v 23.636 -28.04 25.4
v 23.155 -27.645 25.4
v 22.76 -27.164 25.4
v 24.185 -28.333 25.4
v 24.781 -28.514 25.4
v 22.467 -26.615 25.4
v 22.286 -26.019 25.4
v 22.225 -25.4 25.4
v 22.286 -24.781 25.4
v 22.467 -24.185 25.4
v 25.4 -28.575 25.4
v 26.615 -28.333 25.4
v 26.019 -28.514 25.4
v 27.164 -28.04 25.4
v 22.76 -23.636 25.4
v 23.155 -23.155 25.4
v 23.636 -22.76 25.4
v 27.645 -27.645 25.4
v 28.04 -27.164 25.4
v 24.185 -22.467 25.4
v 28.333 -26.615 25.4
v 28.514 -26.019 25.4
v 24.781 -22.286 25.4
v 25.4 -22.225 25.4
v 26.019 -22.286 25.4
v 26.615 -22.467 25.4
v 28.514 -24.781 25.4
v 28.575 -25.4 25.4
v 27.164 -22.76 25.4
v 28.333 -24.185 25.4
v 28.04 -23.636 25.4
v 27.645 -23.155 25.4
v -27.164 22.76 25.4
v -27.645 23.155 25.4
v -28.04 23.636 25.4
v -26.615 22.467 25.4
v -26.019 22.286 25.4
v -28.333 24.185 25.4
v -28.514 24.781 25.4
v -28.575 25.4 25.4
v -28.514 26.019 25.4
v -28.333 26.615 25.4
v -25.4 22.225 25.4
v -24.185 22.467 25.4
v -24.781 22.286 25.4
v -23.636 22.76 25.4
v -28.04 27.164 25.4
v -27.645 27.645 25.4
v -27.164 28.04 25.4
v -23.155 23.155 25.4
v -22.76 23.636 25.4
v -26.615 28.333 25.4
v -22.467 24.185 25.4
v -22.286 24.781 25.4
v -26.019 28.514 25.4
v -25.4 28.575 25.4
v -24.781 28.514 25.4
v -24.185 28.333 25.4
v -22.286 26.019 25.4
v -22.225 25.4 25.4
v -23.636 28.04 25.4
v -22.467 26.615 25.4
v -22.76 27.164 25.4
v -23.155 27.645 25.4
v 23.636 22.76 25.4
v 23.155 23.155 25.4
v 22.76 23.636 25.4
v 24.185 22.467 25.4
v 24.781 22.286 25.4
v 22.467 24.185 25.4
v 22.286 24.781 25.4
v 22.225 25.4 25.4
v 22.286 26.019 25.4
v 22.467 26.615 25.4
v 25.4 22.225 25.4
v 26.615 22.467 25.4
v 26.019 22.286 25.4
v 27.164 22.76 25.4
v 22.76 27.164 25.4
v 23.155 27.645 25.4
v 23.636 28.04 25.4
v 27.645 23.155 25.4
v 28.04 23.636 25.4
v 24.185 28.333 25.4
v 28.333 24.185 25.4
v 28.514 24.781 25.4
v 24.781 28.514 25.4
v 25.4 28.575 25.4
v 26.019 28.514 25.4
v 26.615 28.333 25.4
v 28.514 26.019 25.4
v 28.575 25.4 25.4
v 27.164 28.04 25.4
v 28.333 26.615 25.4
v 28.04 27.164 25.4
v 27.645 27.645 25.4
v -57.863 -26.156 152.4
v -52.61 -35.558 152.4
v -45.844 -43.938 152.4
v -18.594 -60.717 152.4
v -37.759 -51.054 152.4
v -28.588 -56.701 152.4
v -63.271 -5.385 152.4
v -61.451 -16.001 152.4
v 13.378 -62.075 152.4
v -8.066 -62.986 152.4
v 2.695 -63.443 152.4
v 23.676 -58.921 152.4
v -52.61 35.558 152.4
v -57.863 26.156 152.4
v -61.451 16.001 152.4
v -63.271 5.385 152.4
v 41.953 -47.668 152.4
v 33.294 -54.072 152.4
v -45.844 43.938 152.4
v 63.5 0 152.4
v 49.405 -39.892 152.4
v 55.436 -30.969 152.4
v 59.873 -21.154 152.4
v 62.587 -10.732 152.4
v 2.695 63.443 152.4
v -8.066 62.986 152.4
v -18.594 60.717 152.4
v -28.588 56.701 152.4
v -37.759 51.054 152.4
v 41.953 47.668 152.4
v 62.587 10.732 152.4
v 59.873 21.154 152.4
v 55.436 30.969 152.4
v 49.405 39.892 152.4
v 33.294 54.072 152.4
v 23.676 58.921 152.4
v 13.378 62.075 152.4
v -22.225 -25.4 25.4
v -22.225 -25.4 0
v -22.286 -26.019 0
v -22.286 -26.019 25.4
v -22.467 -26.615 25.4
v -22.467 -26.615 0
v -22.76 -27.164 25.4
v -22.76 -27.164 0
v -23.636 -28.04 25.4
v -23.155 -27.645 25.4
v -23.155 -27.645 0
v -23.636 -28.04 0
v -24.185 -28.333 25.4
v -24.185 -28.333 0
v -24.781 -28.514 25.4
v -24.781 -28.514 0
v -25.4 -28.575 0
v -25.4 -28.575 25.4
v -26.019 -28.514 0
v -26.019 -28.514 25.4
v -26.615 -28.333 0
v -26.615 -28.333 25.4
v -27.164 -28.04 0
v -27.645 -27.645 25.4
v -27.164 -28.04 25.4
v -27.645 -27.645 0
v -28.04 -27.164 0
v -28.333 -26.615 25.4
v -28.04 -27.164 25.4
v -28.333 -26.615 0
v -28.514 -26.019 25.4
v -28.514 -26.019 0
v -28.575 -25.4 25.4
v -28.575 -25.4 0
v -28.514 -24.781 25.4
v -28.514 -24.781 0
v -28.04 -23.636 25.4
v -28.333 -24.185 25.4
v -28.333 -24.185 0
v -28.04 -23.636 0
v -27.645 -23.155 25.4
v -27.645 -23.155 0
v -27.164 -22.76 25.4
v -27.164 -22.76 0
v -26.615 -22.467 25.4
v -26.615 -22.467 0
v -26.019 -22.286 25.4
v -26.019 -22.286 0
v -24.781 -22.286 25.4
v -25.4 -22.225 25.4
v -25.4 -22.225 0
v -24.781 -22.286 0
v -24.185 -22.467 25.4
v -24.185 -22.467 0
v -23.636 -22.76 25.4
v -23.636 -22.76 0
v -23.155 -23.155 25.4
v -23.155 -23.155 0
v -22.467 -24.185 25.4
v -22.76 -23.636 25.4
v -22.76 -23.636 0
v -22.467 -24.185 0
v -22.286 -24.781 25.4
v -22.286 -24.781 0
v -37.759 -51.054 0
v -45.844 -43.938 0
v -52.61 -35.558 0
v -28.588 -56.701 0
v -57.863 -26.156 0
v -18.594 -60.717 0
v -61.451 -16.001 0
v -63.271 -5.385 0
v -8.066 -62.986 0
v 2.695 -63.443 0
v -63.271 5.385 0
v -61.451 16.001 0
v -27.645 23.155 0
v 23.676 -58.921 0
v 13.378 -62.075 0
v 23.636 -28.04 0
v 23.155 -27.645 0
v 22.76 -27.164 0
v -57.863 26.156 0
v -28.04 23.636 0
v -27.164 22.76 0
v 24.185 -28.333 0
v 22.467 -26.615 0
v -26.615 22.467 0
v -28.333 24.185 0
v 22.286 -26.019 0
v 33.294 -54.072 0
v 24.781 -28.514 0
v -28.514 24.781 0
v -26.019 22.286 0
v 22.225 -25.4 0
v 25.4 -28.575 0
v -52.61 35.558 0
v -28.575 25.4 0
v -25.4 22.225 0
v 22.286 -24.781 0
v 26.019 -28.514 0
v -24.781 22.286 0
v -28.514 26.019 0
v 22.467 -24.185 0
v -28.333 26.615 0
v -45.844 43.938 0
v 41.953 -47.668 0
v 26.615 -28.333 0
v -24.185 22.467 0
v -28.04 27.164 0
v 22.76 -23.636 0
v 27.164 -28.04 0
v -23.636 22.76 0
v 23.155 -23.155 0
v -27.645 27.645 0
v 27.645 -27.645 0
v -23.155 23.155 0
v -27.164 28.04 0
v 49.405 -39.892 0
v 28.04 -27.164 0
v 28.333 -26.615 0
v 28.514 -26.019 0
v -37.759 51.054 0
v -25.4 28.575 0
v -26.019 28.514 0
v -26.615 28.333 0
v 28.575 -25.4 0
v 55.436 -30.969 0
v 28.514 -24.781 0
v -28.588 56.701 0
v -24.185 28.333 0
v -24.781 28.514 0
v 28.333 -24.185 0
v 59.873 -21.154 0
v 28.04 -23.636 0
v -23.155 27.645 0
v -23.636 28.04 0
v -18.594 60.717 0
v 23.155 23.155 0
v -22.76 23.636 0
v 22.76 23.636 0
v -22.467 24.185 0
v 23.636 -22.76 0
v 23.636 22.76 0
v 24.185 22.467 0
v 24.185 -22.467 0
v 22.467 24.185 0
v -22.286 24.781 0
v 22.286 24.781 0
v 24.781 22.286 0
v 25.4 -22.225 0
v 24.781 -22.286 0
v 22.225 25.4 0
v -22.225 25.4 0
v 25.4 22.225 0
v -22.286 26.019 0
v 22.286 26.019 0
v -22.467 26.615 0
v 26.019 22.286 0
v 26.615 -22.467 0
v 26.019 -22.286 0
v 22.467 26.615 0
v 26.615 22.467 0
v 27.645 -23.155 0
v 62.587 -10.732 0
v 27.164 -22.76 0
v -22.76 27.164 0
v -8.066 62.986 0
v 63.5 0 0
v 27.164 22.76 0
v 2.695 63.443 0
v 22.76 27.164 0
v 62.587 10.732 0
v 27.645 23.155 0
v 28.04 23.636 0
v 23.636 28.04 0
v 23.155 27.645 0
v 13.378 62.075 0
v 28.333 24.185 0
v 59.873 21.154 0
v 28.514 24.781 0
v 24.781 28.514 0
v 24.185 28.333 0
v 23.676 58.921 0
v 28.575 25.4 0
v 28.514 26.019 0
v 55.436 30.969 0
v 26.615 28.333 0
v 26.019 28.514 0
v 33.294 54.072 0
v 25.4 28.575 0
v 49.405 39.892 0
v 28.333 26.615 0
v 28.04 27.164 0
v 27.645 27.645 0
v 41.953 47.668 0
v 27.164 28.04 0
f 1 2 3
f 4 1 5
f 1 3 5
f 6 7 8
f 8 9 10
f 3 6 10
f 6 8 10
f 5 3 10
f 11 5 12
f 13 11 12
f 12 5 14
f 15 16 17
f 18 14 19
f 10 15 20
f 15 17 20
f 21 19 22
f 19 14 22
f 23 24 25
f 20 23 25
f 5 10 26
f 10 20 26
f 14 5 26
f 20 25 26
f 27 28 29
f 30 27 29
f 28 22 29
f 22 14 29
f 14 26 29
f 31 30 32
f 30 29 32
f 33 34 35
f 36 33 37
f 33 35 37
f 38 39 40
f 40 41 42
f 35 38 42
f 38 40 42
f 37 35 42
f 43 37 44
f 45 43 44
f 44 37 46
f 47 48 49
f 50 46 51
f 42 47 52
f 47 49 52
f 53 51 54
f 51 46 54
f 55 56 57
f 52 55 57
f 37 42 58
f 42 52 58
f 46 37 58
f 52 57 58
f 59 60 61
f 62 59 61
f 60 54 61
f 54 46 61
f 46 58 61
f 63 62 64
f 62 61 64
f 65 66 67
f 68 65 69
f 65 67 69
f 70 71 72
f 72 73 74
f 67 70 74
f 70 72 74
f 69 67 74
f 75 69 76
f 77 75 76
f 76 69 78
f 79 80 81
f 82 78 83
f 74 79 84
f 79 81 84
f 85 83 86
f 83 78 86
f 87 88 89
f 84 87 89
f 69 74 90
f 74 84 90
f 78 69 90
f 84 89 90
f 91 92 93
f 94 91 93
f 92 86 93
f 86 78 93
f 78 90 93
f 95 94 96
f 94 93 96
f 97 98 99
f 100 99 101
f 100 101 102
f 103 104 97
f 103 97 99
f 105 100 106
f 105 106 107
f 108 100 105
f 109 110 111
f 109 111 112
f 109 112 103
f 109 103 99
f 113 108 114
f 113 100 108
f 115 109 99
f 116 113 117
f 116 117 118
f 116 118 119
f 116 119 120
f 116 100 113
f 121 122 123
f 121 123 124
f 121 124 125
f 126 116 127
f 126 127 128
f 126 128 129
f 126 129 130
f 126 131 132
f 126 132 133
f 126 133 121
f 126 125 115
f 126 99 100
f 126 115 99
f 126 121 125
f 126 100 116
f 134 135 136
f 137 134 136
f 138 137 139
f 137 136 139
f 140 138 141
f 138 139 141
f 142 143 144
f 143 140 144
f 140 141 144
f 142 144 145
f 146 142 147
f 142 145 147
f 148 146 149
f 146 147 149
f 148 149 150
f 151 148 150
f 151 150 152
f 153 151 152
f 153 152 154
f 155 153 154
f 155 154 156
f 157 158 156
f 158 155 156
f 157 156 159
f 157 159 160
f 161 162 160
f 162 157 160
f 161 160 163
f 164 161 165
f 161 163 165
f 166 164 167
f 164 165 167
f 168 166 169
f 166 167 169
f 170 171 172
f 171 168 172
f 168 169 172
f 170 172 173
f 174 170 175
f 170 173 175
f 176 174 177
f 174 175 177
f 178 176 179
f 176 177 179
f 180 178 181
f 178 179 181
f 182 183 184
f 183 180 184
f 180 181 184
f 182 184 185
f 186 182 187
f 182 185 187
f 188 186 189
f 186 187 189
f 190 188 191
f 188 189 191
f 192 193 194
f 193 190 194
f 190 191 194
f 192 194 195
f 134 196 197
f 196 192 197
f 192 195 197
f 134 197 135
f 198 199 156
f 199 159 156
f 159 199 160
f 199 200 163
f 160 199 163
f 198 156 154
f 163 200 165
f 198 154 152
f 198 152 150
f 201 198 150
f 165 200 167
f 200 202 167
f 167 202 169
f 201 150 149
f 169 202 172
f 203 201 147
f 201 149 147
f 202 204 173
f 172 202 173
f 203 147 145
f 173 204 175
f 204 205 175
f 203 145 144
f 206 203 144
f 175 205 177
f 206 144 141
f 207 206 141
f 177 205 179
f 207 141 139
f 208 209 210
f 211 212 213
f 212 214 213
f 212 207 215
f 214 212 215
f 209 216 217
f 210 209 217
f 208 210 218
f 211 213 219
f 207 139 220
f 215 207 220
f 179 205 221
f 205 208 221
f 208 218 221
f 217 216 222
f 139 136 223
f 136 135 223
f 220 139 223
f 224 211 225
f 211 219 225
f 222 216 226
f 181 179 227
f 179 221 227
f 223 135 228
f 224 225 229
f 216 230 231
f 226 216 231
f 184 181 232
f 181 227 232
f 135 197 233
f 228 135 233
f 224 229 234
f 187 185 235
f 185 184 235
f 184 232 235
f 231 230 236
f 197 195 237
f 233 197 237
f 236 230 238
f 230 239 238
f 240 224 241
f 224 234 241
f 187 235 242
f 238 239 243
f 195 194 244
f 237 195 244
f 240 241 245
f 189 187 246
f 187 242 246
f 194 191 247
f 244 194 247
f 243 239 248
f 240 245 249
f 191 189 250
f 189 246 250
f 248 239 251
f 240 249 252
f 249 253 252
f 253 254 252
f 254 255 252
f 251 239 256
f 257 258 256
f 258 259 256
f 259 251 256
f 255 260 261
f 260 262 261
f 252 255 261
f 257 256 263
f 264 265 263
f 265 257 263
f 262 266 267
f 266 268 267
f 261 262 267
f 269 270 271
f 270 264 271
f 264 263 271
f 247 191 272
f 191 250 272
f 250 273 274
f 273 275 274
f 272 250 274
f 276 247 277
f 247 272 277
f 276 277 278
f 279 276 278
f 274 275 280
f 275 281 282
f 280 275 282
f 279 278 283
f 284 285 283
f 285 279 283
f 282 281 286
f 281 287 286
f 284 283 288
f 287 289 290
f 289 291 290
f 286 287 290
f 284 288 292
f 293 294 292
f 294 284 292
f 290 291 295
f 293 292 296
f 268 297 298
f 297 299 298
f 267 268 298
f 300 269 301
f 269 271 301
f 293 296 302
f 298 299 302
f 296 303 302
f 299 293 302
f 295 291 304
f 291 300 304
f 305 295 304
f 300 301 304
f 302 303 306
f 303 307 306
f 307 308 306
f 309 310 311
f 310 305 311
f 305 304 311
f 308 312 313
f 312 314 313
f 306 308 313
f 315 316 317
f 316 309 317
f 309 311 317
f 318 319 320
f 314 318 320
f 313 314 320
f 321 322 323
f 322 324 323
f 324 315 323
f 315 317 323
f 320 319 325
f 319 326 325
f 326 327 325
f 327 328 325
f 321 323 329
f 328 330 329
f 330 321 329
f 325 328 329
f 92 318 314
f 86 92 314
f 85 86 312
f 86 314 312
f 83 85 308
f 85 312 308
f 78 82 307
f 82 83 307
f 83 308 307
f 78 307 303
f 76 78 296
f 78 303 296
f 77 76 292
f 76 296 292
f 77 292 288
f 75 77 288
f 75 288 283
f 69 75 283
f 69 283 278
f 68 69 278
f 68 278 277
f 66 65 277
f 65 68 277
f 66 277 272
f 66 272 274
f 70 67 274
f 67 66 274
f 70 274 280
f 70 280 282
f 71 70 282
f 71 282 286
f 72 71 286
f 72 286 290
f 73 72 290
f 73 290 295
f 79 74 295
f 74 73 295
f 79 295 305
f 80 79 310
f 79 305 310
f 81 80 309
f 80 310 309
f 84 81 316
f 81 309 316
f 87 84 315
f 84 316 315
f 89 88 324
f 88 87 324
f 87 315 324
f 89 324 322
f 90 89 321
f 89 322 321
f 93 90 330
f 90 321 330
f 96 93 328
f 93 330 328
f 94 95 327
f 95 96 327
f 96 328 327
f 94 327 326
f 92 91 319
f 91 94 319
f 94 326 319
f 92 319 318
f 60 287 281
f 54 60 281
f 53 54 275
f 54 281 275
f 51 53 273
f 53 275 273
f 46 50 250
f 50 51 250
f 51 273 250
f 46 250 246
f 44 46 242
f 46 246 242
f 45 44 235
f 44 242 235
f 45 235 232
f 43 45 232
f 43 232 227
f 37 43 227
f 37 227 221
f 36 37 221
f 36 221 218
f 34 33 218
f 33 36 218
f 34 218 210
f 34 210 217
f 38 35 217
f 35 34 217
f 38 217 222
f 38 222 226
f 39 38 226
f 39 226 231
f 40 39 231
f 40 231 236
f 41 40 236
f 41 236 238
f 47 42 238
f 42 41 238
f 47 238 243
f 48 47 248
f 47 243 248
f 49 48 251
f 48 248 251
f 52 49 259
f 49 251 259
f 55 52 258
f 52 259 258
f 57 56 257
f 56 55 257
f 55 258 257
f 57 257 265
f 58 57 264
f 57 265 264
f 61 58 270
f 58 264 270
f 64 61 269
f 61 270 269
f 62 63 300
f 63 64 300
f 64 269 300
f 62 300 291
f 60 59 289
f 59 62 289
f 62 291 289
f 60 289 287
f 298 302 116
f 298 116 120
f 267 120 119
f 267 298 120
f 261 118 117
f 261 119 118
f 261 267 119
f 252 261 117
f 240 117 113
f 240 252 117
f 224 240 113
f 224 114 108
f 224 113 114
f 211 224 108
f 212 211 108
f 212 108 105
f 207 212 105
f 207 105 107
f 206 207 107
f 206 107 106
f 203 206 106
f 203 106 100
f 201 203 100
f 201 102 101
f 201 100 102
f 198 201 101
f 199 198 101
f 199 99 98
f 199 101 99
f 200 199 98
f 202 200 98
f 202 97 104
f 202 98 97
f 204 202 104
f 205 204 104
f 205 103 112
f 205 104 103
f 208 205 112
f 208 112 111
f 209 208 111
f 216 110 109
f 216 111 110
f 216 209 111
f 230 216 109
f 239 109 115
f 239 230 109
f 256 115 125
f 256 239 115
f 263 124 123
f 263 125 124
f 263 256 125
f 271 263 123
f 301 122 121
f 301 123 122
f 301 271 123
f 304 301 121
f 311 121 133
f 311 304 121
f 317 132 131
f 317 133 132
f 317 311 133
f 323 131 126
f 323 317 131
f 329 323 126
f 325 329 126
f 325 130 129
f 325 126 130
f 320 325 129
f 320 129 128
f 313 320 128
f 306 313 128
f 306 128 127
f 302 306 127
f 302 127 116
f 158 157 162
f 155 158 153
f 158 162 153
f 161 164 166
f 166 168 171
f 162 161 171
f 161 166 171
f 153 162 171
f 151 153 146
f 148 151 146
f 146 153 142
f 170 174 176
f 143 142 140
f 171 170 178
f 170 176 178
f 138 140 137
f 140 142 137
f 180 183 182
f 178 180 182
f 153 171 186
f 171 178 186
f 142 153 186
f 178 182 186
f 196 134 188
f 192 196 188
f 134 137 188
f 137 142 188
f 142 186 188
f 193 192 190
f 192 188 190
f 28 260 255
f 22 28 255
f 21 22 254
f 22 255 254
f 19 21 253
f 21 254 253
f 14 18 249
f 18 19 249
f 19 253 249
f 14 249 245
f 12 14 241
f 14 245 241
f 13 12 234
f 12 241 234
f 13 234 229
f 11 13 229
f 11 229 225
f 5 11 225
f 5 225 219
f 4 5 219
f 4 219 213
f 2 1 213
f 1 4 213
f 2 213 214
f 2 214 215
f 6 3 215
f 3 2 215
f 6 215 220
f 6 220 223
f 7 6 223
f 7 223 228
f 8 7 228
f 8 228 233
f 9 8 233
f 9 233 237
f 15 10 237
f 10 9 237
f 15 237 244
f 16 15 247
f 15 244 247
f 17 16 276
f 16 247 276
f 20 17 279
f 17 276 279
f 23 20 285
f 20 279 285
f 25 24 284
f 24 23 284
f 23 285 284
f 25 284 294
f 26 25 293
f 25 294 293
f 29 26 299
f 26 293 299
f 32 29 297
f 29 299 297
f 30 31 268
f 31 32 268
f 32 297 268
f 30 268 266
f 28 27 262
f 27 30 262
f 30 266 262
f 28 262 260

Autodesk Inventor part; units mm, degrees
ref_plane "YZ Plane" through (0, 0, 0) normal (1, 0, 0) x (0, 1, 0)
ref_plane "XZ Plane" through (0, 0, 0) normal (0, 1, 0) x (-1, 0, 0)
ref_plane "XY Plane" through (0, 0, 0) normal (0, 0, 1) x (1, 0, 0)
sketch "Sketch1" plane through (0, 0, 0) normal (0, 0, 1) x (1, 0, 0)
  circle A0 centre (0, 0) radius 63.5
  circle A1 centre (0, 0) radius 35.921 construction
  line L0 (-25.4, 25.4) -> (25.4, 25.4) construction
  line L1 (25.4, 25.4) -> (25.4, -25.4) construction
  line L2 (25.4, -25.4) -> (-25.4, -25.4) construction
  line L3 (-25.4, -25.4) -> (-25.4, 25.4) construction
  circle A2 centre (-25.4, 25.4) radius 3.175
  circle A3 centre (25.4, 25.4) radius 3.175
  circle A4 centre (25.4, -25.4) radius 3.175
  circle A5 centre (-25.4, -25.4) radius 3.175
  dimension "d0" = 127
  dimension "d2" = 6.35
  dimension "d7" = 50.8
extrude "Extrusion1" add sketch "Sketch1" along normal blind 25.4
sketch "Sketch2" plane through (0, 0, 25.4) normal (0, 0, 1) x (1, 0, 0)
  circle A0 centre (0, 0) radius 63.5
extrude "Extrusion2" add sketch "Sketch2" along normal blind 127
properties part number "Motors"
